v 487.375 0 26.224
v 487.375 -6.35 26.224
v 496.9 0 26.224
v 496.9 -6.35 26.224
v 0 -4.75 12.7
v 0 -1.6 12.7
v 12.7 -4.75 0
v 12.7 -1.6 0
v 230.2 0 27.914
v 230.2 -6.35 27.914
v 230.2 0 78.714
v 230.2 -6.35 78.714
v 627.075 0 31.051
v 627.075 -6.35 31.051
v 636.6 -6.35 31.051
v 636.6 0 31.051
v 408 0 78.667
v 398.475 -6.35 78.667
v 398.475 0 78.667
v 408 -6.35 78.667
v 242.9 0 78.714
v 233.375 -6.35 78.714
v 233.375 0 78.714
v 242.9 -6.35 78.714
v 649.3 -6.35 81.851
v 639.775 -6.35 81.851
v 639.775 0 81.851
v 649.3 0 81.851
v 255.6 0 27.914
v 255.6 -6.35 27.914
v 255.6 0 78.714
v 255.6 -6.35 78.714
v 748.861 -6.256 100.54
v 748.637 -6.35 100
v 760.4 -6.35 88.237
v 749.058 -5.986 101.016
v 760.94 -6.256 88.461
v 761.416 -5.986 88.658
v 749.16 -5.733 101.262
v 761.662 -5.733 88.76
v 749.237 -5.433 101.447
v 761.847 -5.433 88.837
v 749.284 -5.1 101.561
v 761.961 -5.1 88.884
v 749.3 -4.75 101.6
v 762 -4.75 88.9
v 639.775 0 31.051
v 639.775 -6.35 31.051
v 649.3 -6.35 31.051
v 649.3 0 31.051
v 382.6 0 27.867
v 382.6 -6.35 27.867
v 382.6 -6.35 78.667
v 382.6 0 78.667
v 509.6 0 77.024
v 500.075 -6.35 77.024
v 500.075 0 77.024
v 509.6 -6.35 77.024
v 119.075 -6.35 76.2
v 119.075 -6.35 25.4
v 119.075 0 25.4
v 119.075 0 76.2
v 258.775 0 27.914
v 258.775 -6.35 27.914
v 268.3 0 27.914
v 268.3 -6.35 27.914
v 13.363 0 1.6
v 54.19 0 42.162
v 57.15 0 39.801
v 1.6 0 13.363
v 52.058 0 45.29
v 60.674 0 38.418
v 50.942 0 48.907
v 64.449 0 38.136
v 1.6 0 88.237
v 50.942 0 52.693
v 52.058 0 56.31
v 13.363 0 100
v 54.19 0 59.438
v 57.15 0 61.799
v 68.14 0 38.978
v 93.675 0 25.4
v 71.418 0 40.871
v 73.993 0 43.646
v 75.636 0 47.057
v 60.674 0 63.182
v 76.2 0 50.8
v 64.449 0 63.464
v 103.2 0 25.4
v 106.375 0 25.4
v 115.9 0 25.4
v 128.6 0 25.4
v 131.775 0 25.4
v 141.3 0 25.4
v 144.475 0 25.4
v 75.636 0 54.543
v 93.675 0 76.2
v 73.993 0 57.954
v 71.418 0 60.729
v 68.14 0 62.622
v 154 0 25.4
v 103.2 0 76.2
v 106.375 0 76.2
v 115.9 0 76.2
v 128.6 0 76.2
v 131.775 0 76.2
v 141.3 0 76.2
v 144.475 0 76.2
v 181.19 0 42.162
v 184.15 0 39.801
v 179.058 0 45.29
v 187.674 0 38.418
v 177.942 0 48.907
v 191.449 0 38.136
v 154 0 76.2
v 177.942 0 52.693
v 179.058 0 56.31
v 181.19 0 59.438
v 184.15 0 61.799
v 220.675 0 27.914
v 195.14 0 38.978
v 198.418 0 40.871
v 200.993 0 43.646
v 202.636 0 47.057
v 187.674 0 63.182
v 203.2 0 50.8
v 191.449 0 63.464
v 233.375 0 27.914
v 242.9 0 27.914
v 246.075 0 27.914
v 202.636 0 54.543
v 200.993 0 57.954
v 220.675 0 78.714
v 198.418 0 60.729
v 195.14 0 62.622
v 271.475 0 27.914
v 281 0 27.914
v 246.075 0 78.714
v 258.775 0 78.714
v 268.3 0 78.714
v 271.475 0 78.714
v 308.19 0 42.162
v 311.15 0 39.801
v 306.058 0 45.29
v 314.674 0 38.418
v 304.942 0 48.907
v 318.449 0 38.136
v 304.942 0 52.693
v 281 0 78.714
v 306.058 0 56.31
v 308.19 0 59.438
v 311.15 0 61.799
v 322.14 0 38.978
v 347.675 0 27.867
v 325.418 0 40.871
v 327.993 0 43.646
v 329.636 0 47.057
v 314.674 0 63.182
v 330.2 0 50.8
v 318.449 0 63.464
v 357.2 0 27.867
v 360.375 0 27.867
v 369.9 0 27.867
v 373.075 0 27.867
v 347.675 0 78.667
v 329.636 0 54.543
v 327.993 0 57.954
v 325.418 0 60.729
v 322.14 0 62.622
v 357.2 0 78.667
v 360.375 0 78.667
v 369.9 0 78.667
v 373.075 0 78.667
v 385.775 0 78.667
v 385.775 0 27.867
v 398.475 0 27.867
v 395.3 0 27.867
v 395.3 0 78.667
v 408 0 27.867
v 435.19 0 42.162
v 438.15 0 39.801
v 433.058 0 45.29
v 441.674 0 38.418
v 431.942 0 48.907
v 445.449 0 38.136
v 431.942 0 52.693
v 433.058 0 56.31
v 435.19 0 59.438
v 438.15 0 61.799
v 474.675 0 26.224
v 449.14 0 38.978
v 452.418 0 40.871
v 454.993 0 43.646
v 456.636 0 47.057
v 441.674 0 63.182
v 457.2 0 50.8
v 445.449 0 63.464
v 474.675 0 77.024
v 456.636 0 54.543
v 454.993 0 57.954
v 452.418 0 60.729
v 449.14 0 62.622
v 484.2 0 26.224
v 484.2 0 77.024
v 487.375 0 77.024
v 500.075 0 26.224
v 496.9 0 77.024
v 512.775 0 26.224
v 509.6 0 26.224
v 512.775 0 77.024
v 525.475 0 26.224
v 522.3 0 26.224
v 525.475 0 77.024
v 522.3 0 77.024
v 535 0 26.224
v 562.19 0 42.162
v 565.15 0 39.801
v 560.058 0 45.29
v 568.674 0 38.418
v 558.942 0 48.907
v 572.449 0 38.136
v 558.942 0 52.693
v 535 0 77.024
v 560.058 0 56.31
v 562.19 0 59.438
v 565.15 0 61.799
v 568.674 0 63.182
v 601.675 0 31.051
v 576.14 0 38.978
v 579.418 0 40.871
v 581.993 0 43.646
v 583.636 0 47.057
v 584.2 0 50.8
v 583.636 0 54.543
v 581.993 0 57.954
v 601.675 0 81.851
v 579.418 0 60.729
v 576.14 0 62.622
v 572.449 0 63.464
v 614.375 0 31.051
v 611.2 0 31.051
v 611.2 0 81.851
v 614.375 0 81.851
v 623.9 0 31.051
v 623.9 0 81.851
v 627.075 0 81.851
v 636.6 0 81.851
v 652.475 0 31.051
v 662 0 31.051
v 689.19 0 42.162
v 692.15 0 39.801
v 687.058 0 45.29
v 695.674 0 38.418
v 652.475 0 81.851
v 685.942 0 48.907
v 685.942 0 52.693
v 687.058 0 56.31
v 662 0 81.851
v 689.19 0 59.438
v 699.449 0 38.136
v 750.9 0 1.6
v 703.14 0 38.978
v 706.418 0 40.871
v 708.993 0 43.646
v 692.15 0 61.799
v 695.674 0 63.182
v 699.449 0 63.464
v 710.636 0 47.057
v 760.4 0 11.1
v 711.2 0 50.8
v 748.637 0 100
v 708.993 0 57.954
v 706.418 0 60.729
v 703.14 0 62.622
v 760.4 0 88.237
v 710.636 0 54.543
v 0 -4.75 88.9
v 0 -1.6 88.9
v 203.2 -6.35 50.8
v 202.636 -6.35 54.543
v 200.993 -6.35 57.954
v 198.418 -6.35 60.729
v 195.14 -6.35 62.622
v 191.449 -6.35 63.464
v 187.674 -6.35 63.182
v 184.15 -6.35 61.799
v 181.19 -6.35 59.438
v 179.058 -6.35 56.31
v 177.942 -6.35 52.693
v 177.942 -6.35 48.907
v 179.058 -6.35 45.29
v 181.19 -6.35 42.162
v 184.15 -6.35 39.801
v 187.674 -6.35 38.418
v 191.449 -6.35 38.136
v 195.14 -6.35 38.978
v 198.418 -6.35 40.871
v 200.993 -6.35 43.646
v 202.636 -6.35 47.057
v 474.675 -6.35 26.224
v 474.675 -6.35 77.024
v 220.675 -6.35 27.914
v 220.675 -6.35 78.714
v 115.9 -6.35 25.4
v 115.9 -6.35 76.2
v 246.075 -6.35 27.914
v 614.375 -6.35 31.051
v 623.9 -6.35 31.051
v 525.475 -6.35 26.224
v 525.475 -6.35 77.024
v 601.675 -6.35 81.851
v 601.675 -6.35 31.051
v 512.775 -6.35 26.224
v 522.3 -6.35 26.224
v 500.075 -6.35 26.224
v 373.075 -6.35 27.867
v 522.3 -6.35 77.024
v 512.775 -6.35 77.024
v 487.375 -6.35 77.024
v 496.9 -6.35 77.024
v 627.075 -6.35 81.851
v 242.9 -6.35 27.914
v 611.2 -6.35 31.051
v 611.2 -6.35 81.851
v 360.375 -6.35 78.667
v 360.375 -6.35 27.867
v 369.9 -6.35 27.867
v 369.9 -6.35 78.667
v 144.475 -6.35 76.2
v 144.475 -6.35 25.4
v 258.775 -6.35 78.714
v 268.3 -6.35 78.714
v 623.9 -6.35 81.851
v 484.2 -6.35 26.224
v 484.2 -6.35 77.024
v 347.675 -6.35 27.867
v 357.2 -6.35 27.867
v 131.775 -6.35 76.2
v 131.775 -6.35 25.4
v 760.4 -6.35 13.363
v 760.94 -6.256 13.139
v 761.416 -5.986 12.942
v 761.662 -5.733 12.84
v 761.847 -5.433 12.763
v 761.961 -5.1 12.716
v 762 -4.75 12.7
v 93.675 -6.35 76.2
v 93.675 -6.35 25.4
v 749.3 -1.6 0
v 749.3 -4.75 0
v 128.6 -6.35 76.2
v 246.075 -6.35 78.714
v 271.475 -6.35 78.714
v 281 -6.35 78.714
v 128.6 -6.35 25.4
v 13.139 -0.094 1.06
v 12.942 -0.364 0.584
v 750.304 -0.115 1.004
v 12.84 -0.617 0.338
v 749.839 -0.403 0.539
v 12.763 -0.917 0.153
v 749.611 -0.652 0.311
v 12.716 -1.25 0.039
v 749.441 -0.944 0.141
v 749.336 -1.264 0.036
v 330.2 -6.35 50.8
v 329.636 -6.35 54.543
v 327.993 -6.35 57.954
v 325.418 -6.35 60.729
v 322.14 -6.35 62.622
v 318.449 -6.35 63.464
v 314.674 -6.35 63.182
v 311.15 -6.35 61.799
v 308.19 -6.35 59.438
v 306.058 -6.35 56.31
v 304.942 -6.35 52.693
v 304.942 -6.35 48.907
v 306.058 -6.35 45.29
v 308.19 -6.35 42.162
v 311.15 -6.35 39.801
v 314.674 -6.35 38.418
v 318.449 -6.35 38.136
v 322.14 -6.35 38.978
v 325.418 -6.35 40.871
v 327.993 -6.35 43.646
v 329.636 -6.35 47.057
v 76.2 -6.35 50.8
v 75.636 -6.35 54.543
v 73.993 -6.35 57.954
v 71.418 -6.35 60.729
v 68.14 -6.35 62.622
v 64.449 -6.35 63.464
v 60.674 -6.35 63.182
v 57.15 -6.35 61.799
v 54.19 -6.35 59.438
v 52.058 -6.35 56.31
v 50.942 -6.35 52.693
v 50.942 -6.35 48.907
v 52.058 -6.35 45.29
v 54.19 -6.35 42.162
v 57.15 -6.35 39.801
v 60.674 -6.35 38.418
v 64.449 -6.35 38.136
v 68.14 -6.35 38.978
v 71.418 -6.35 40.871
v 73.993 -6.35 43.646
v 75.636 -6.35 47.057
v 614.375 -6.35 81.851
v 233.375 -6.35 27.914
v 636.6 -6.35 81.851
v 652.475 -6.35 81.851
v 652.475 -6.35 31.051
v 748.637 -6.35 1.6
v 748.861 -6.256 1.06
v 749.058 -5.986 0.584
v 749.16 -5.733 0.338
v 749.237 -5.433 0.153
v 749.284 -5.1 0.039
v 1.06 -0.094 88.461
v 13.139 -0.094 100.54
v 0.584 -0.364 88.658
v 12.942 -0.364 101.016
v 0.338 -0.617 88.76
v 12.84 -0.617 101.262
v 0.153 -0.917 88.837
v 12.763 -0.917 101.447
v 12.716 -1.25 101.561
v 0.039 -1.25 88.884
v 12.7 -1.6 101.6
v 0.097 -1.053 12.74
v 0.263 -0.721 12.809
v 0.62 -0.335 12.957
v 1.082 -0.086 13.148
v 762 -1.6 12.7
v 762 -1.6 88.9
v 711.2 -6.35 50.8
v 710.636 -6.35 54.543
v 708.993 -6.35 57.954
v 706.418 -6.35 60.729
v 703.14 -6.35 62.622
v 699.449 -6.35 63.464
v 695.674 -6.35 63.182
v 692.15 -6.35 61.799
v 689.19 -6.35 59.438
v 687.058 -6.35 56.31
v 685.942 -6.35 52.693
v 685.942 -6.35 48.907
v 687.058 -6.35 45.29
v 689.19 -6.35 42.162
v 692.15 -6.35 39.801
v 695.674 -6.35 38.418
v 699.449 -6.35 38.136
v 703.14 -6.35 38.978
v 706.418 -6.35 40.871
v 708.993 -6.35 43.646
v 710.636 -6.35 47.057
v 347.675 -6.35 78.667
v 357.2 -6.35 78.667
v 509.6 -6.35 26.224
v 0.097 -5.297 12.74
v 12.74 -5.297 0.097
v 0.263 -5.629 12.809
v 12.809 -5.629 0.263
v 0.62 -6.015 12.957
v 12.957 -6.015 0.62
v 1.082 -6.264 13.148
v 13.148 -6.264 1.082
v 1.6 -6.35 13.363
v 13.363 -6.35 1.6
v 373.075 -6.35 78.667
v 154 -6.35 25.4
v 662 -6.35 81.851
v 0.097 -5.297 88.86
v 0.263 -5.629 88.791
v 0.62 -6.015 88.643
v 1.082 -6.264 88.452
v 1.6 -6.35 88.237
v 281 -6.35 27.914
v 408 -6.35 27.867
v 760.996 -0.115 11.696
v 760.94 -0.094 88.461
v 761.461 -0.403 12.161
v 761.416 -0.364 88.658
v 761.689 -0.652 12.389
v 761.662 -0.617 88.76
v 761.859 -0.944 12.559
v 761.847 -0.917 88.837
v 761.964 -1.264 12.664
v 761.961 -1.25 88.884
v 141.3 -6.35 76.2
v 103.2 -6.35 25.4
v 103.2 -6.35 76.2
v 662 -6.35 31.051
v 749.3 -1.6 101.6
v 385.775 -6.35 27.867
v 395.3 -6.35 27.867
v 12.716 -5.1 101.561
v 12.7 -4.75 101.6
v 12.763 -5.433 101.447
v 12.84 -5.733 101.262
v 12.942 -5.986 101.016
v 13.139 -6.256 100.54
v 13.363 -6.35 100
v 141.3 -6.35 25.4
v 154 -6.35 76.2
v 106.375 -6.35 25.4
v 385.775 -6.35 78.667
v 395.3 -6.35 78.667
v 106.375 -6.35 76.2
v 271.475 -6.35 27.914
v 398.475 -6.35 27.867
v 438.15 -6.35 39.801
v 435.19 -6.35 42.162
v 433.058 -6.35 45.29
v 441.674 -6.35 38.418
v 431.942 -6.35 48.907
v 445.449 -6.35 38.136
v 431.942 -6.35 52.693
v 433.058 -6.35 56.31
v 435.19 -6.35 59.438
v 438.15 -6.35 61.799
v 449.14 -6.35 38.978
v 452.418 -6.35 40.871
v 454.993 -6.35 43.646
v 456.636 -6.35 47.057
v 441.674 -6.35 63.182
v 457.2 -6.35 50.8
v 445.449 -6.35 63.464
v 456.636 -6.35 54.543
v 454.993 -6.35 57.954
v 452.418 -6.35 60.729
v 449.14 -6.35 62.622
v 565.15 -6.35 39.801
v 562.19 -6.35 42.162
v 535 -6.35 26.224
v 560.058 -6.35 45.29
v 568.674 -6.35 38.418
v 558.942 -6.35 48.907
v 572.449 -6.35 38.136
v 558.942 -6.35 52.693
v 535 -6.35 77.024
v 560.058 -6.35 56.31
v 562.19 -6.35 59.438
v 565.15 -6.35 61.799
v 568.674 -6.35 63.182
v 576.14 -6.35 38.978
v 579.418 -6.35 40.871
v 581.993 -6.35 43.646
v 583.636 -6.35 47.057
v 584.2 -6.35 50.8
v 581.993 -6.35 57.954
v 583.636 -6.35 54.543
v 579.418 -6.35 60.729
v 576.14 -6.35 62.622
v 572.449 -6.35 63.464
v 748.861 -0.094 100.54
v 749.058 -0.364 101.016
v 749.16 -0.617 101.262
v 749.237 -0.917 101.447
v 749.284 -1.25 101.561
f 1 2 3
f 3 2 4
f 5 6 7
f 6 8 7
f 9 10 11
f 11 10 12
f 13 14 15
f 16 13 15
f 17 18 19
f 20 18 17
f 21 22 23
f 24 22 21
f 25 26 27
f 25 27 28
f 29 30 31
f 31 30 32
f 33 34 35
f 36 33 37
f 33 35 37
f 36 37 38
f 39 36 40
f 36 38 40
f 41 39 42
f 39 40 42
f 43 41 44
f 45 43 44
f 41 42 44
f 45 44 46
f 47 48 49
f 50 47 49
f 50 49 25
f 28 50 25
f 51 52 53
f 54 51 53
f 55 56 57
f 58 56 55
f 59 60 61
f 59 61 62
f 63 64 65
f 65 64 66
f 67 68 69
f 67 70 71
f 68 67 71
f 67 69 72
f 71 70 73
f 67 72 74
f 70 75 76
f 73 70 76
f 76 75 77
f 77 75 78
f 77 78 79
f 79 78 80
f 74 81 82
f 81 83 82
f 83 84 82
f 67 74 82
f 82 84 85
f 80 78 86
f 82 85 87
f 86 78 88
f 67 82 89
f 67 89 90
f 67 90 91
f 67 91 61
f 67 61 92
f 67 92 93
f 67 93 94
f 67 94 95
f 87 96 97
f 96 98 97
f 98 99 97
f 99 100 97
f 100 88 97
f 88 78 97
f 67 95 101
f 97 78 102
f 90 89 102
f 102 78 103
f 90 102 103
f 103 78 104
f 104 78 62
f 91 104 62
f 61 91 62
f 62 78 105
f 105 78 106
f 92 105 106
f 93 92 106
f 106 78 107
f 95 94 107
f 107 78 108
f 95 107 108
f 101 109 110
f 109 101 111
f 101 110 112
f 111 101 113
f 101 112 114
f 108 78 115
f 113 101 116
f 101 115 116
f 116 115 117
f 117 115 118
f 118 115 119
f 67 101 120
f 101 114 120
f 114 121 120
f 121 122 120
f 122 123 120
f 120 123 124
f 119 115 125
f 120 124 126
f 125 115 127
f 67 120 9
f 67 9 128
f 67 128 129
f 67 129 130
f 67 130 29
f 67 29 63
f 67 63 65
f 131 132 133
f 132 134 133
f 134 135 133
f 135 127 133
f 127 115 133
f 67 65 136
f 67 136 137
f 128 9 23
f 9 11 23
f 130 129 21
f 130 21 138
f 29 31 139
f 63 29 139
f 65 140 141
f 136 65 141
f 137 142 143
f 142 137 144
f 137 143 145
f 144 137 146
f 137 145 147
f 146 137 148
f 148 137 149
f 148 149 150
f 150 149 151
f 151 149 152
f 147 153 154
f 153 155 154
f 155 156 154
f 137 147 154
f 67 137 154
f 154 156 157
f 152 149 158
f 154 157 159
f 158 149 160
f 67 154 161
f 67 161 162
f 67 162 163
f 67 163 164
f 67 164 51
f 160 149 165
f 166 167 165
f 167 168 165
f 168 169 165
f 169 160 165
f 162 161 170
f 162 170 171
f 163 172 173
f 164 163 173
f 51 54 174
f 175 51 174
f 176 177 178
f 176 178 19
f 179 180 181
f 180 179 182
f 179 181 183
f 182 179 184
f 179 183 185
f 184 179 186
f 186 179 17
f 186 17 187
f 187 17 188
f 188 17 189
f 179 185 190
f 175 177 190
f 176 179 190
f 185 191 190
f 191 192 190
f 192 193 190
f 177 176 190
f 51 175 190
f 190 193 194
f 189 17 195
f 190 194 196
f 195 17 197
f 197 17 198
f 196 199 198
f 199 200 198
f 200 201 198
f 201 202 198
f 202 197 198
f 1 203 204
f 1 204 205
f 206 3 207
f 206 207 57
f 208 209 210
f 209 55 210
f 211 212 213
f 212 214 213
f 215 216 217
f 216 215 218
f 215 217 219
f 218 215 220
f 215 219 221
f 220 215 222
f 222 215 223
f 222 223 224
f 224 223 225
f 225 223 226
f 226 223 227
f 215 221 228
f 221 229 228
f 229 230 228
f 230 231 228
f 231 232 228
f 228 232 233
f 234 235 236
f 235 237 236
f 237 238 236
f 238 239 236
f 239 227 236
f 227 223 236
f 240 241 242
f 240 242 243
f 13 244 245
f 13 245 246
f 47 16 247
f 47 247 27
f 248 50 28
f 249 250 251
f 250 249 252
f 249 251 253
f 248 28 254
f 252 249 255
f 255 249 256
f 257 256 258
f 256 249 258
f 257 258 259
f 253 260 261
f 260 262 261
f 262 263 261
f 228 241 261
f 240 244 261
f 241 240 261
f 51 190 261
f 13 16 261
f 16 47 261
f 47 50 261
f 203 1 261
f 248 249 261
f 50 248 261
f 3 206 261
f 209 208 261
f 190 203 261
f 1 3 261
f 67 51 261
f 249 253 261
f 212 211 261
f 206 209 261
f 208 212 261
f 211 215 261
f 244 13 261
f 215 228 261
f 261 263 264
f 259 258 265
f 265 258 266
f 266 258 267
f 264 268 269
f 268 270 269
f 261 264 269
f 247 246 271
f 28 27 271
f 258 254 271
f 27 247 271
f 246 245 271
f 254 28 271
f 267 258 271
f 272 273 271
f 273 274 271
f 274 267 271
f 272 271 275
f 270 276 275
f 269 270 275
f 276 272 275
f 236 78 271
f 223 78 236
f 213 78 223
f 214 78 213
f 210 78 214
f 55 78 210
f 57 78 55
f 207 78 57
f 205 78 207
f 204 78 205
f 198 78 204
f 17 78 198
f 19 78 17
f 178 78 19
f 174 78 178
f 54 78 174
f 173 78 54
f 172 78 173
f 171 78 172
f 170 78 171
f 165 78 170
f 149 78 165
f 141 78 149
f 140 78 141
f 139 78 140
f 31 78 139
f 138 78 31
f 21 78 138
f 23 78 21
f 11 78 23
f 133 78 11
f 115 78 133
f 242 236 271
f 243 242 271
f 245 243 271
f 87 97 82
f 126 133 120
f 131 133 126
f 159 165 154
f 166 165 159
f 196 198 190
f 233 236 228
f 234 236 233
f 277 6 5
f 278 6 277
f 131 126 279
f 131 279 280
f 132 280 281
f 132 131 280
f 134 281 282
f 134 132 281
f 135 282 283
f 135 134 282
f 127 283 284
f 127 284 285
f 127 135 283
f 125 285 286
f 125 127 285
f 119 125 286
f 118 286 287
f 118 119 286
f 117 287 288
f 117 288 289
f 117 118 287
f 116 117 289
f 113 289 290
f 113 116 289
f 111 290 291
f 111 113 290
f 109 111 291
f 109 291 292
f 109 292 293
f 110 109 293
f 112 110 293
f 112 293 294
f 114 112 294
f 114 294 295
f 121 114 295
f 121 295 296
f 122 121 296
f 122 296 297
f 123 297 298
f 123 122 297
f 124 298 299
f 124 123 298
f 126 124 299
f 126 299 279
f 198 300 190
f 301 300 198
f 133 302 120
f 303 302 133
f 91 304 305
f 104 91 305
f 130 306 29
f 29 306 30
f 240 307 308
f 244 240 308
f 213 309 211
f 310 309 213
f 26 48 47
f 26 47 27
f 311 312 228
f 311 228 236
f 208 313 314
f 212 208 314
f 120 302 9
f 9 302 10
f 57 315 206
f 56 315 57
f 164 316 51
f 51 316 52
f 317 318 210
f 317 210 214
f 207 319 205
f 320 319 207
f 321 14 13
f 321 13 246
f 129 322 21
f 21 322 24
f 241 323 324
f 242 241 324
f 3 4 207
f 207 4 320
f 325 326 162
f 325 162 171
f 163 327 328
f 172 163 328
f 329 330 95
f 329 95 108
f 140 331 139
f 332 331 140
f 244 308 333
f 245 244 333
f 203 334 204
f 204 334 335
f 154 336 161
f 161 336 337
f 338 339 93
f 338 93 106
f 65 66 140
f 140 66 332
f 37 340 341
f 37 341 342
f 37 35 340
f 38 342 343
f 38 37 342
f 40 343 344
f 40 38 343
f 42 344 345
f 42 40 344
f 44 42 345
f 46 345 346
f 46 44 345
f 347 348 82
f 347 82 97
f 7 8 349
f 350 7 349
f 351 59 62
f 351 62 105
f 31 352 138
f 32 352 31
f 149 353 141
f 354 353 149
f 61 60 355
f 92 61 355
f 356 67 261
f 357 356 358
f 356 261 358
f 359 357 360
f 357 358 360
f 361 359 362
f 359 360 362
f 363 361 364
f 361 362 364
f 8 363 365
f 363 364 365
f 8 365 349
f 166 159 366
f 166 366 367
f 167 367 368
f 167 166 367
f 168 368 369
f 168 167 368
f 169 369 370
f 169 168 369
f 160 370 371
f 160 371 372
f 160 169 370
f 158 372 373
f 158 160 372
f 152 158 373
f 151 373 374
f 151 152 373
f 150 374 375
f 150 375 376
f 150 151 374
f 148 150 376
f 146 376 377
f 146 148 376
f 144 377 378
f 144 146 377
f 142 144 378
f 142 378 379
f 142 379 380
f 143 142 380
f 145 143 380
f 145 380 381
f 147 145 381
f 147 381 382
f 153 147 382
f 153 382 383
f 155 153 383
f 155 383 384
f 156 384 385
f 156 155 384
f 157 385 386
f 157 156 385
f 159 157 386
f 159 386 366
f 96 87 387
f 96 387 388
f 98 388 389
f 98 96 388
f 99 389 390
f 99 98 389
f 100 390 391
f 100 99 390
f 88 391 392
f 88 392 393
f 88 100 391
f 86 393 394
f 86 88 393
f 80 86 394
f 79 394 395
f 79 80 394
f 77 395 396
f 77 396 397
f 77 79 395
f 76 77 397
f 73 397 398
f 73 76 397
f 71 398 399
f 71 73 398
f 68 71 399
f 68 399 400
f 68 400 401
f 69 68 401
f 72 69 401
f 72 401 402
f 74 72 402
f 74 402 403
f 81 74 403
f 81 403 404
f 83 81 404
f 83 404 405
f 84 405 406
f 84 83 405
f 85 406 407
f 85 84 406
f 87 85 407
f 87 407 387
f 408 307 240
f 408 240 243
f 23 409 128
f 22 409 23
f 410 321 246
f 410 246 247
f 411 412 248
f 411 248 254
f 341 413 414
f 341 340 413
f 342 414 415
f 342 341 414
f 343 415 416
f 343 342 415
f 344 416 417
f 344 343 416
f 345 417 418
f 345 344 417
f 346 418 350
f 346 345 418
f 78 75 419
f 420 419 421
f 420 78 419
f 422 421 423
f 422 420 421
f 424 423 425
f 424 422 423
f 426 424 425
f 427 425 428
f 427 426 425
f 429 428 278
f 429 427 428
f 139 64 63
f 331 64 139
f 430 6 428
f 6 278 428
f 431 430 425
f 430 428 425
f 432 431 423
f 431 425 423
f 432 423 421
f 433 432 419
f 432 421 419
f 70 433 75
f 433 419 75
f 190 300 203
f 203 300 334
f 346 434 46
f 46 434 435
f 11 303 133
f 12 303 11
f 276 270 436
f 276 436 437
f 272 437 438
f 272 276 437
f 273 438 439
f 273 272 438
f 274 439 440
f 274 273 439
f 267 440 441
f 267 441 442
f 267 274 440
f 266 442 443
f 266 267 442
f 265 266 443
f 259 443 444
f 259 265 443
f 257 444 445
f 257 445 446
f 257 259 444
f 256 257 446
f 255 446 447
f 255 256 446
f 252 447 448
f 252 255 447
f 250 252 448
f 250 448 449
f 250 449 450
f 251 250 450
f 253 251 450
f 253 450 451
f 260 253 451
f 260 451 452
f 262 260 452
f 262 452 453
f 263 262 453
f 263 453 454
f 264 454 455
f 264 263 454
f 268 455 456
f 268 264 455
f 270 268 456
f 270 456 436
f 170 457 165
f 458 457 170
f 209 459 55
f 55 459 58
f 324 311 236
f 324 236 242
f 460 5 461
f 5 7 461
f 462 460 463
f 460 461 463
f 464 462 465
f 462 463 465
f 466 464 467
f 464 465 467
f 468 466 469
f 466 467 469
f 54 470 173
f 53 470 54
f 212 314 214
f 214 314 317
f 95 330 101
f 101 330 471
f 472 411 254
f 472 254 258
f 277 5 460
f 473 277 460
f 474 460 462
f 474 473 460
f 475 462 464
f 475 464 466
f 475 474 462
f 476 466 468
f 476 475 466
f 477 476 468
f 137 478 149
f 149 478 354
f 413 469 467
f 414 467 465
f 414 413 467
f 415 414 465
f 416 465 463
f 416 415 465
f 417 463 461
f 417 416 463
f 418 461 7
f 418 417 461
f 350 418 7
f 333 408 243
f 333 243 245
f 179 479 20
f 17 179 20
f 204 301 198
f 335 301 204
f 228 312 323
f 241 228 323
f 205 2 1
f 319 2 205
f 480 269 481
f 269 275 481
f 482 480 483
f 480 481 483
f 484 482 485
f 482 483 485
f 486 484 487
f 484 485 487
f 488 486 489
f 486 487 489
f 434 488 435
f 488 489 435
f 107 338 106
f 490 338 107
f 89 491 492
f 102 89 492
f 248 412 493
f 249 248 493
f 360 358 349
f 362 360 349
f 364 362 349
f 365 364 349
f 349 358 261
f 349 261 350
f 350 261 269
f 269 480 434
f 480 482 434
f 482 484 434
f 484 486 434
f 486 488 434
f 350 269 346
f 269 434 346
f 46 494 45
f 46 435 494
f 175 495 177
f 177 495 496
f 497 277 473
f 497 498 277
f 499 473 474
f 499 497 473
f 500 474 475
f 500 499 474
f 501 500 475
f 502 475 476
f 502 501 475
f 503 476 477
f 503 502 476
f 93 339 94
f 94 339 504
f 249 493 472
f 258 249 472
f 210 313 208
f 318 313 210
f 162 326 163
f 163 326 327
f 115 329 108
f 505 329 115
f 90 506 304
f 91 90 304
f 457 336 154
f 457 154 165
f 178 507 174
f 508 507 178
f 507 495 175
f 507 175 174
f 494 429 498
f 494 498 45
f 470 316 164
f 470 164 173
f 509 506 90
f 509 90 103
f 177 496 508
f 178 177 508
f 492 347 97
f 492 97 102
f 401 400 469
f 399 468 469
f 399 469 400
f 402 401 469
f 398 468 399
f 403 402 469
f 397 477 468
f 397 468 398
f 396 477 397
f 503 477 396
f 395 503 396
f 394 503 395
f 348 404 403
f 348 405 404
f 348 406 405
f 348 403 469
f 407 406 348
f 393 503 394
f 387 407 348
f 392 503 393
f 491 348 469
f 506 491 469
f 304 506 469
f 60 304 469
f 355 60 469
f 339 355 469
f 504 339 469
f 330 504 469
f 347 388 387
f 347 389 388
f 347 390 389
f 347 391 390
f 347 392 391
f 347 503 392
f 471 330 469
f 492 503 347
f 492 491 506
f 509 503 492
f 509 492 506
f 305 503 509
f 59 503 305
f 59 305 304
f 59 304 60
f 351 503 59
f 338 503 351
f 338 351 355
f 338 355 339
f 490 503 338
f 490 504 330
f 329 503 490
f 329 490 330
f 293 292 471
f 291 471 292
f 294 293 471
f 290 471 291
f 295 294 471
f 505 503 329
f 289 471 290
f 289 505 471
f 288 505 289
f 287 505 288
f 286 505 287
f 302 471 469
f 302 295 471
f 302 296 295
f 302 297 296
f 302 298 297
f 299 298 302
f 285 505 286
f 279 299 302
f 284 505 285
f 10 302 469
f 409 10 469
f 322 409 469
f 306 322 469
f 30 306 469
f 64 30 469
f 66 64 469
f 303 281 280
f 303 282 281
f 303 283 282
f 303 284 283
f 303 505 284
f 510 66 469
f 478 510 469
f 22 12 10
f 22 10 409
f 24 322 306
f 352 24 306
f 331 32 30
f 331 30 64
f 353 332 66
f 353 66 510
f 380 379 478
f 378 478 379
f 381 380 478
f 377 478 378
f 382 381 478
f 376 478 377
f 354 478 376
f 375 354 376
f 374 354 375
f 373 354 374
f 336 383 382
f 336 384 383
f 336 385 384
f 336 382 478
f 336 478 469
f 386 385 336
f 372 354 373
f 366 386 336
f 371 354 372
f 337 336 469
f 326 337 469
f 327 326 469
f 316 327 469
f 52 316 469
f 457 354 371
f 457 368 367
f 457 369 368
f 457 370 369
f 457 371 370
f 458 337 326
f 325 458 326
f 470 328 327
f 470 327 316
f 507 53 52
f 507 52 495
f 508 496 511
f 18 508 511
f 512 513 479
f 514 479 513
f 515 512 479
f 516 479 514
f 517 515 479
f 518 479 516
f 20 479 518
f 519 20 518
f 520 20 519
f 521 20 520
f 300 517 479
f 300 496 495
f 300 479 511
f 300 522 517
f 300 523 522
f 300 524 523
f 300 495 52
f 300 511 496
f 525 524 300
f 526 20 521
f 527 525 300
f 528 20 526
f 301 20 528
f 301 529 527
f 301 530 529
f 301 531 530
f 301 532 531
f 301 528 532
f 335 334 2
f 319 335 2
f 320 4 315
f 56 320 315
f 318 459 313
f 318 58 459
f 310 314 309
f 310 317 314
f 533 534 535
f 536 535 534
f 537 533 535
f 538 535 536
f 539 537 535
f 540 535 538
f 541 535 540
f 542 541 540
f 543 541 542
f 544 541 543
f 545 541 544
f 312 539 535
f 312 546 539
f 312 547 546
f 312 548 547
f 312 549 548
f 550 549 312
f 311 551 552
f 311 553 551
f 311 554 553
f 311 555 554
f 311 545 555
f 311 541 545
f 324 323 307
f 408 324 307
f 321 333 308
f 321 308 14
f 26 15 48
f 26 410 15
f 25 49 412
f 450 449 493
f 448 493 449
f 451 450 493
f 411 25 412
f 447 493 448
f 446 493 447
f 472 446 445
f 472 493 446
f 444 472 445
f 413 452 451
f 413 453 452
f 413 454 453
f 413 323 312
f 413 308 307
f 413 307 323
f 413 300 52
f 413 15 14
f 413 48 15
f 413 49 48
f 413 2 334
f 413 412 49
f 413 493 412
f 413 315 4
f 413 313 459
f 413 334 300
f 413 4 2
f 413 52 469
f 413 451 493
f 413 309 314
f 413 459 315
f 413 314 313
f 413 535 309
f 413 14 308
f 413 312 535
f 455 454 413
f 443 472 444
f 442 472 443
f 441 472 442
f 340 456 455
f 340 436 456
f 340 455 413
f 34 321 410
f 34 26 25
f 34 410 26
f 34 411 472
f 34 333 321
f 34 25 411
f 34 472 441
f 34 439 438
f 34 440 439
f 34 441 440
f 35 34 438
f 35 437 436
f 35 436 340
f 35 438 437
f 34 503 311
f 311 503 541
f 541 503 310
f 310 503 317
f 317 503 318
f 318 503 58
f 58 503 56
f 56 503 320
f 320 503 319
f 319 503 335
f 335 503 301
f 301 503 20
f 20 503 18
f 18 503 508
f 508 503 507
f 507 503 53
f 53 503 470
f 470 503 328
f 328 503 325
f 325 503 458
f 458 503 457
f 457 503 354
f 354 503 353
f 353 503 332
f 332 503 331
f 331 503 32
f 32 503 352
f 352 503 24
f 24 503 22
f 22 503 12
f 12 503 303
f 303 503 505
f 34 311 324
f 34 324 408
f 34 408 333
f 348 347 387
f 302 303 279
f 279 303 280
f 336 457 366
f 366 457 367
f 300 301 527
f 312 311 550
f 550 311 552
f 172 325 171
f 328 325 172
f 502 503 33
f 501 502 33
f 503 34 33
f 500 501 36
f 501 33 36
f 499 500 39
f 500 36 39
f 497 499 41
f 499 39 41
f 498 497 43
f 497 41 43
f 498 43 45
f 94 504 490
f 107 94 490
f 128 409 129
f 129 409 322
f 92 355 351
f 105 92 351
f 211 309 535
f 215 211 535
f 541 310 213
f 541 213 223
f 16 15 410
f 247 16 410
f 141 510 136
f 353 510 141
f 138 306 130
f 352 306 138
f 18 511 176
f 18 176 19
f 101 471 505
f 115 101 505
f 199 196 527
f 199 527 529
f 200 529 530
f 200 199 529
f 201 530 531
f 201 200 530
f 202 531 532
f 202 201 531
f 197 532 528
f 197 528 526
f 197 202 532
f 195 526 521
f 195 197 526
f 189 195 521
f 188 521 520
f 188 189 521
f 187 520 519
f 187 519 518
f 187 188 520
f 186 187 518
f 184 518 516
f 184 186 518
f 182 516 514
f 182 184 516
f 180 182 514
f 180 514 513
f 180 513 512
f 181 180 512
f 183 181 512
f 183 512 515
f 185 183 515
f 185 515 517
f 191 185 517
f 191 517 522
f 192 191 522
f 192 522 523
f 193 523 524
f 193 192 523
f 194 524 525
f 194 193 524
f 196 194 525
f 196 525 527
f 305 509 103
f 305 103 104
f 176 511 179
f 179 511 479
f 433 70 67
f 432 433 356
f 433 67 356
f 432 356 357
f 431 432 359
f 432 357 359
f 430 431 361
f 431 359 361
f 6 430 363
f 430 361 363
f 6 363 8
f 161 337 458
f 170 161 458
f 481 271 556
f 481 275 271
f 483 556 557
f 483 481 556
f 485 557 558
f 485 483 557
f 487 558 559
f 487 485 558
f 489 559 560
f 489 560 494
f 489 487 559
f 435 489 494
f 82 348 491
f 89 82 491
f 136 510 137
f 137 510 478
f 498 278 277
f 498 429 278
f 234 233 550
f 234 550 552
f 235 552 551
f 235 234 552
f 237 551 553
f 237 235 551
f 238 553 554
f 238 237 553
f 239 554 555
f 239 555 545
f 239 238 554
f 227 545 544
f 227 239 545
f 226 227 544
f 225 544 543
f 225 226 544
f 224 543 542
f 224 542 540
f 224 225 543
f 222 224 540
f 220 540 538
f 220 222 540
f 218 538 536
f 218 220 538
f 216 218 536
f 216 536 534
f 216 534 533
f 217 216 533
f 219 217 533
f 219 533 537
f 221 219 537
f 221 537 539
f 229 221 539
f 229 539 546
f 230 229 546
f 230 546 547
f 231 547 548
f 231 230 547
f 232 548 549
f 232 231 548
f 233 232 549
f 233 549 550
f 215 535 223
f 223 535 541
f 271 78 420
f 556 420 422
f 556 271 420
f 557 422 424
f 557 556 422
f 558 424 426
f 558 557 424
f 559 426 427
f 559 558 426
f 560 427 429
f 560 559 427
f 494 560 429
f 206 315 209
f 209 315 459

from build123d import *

# Parameters (mm, degrees)
F0_W     = 762
F0_H     = 101.6
F0_R     = 12.7
F1_DEPTH = 6.35
F2_W     = 9.525
F2_H     = 50.8
F3_DEPTH = 6.351
F4_SIZE  = 12.7
F5_R     = 1.6002


with BuildPart() as f1:
    # F0 (on Front) → F1 (new body)
    with BuildSketch(Plane.XZ):
        with Locations((381, 50.8)):
            Rectangle(F0_W, F0_H)
        with Locations((63.5, 50.8)):
            Circle(F0_R, mode=Mode.SUBTRACT)
        with Locations((190.5, 50.8)):
            Circle(F0_R, mode=Mode.SUBTRACT)
        with Locations((317.5, 50.8)):
            Circle(F0_R, mode=Mode.SUBTRACT)
        with Locations((444.5, 50.8)):
            Circle(F0_R, mode=Mode.SUBTRACT)
        with Locations((571.5, 50.8)):
            Circle(F0_R, mode=Mode.SUBTRACT)
        with Locations((698.5, 50.8)):
            Circle(F0_R, mode=Mode.SUBTRACT)
    extrude(amount=F1_DEPTH)

    # F2 (on face) → F3 (cut, through all)
    with BuildSketch(Plane.XZ.offset(6.35)):
        with Locations((98.4377, 50.8)):
            Rectangle(F2_W, F2_H)
        with Locations((111.1377, 50.8)):
            Rectangle(F2_W, F2_H)
        with Locations((123.8377, 50.8)):
            Rectangle(F2_W, F2_H)
        with Locations((136.5377, 50.8)):
            Rectangle(F2_W, F2_H)
        with Locations((149.2377, 50.8)):
            Rectangle(F2_W, F2_H)
        with Locations((225.4377, 53.3135051852)):
            Rectangle(F2_W, F2_H)
        with Locations((238.1377, 53.3135051852)):
            Rectangle(F2_W, F2_H)
        with Locations((250.8377, 53.3135051852)):
            Rectangle(F2_W, F2_H)
        with Locations((263.5377, 53.3135051852)):
            Rectangle(F2_W, F2_H)
        with Locations((276.2377, 53.3135051852)):
            Rectangle(F2_W, F2_H)
        with Locations((352.4377, 53.2665329998)):
            Rectangle(F2_W, F2_H)
        with Locations((365.1377, 53.2665329998)):
            Rectangle(F2_W, F2_H)
        with Locations((377.8377, 53.2665329998)):
            Rectangle(F2_W, F2_H)
        with Locations((390.5377, 53.2665329998)):
            Rectangle(F2_W, F2_H)
        with Locations((403.2377, 53.2665329998)):
            Rectangle(F2_W, F2_H)
        with Locations((479.4377, 51.6235756701)):
            Rectangle(F2_W, F2_H)
        with Locations((492.1377, 51.6235756701)):
            Rectangle(F2_W, F2_H)
        with Locations((504.8377, 51.6235756701)):
            Rectangle(F2_W, F2_H)
        with Locations((517.5377, 51.6235756701)):
            Rectangle(F2_W, F2_H)
        with Locations((530.2377, 51.6235756701)):
            Rectangle(F2_W, F2_H)
        with Locations((606.4377, 56.4514326876)):
            Rectangle(F2_W, F2_H)
        with Locations((619.1377, 56.4514326876)):
            Rectangle(F2_W, F2_H)
        with Locations((631.8377, 56.4514326876)):
            Rectangle(F2_W, F2_H)
        with Locations((644.5377, 56.4514326876)):
            Rectangle(F2_W, F2_H)
        with Locations((657.2377, 56.4514326876)):
            Rectangle(F2_W, F2_H)
    extrude(amount=-F3_DEPTH, mode=Mode.SUBTRACT)

    # F4
    f4_edges = [f1.edges().sort_by_distance(p)[0] for p in [
        (0, -3.175, 101.6),
        (0, -3.175, 0),
        (762, -3.175, 0),
        (762, -3.175, 101.6),
    ]]
    chamfer(f4_edges, length=F4_SIZE)

    # F5
    f5_edges = [f1.edges().sort_by_distance(p)[0] for p in [
        (381, -6.35, 101.6),
        (381, 0, 101.6),
        (6.35, -6.35, 95.25),
        (6.35, 0, 95.25),
        (0, -6.35, 50.8),
        (0, 0, 50.8),
        (6.35, -6.35, 6.35),
        (6.35, 0, 6.35),
        (381, -6.35, 0),
        (381, 0, 0),
        (755.65, -6.35, 95.25),
        (755.65, 0, 95.25),
        (762, 0, 50.8),
        (762, -6.35, 50.8),
        (755.65, -6.35, 6.35),
    ]]
    fillet(f5_edges, radius=F5_R)


solid = f1.part
